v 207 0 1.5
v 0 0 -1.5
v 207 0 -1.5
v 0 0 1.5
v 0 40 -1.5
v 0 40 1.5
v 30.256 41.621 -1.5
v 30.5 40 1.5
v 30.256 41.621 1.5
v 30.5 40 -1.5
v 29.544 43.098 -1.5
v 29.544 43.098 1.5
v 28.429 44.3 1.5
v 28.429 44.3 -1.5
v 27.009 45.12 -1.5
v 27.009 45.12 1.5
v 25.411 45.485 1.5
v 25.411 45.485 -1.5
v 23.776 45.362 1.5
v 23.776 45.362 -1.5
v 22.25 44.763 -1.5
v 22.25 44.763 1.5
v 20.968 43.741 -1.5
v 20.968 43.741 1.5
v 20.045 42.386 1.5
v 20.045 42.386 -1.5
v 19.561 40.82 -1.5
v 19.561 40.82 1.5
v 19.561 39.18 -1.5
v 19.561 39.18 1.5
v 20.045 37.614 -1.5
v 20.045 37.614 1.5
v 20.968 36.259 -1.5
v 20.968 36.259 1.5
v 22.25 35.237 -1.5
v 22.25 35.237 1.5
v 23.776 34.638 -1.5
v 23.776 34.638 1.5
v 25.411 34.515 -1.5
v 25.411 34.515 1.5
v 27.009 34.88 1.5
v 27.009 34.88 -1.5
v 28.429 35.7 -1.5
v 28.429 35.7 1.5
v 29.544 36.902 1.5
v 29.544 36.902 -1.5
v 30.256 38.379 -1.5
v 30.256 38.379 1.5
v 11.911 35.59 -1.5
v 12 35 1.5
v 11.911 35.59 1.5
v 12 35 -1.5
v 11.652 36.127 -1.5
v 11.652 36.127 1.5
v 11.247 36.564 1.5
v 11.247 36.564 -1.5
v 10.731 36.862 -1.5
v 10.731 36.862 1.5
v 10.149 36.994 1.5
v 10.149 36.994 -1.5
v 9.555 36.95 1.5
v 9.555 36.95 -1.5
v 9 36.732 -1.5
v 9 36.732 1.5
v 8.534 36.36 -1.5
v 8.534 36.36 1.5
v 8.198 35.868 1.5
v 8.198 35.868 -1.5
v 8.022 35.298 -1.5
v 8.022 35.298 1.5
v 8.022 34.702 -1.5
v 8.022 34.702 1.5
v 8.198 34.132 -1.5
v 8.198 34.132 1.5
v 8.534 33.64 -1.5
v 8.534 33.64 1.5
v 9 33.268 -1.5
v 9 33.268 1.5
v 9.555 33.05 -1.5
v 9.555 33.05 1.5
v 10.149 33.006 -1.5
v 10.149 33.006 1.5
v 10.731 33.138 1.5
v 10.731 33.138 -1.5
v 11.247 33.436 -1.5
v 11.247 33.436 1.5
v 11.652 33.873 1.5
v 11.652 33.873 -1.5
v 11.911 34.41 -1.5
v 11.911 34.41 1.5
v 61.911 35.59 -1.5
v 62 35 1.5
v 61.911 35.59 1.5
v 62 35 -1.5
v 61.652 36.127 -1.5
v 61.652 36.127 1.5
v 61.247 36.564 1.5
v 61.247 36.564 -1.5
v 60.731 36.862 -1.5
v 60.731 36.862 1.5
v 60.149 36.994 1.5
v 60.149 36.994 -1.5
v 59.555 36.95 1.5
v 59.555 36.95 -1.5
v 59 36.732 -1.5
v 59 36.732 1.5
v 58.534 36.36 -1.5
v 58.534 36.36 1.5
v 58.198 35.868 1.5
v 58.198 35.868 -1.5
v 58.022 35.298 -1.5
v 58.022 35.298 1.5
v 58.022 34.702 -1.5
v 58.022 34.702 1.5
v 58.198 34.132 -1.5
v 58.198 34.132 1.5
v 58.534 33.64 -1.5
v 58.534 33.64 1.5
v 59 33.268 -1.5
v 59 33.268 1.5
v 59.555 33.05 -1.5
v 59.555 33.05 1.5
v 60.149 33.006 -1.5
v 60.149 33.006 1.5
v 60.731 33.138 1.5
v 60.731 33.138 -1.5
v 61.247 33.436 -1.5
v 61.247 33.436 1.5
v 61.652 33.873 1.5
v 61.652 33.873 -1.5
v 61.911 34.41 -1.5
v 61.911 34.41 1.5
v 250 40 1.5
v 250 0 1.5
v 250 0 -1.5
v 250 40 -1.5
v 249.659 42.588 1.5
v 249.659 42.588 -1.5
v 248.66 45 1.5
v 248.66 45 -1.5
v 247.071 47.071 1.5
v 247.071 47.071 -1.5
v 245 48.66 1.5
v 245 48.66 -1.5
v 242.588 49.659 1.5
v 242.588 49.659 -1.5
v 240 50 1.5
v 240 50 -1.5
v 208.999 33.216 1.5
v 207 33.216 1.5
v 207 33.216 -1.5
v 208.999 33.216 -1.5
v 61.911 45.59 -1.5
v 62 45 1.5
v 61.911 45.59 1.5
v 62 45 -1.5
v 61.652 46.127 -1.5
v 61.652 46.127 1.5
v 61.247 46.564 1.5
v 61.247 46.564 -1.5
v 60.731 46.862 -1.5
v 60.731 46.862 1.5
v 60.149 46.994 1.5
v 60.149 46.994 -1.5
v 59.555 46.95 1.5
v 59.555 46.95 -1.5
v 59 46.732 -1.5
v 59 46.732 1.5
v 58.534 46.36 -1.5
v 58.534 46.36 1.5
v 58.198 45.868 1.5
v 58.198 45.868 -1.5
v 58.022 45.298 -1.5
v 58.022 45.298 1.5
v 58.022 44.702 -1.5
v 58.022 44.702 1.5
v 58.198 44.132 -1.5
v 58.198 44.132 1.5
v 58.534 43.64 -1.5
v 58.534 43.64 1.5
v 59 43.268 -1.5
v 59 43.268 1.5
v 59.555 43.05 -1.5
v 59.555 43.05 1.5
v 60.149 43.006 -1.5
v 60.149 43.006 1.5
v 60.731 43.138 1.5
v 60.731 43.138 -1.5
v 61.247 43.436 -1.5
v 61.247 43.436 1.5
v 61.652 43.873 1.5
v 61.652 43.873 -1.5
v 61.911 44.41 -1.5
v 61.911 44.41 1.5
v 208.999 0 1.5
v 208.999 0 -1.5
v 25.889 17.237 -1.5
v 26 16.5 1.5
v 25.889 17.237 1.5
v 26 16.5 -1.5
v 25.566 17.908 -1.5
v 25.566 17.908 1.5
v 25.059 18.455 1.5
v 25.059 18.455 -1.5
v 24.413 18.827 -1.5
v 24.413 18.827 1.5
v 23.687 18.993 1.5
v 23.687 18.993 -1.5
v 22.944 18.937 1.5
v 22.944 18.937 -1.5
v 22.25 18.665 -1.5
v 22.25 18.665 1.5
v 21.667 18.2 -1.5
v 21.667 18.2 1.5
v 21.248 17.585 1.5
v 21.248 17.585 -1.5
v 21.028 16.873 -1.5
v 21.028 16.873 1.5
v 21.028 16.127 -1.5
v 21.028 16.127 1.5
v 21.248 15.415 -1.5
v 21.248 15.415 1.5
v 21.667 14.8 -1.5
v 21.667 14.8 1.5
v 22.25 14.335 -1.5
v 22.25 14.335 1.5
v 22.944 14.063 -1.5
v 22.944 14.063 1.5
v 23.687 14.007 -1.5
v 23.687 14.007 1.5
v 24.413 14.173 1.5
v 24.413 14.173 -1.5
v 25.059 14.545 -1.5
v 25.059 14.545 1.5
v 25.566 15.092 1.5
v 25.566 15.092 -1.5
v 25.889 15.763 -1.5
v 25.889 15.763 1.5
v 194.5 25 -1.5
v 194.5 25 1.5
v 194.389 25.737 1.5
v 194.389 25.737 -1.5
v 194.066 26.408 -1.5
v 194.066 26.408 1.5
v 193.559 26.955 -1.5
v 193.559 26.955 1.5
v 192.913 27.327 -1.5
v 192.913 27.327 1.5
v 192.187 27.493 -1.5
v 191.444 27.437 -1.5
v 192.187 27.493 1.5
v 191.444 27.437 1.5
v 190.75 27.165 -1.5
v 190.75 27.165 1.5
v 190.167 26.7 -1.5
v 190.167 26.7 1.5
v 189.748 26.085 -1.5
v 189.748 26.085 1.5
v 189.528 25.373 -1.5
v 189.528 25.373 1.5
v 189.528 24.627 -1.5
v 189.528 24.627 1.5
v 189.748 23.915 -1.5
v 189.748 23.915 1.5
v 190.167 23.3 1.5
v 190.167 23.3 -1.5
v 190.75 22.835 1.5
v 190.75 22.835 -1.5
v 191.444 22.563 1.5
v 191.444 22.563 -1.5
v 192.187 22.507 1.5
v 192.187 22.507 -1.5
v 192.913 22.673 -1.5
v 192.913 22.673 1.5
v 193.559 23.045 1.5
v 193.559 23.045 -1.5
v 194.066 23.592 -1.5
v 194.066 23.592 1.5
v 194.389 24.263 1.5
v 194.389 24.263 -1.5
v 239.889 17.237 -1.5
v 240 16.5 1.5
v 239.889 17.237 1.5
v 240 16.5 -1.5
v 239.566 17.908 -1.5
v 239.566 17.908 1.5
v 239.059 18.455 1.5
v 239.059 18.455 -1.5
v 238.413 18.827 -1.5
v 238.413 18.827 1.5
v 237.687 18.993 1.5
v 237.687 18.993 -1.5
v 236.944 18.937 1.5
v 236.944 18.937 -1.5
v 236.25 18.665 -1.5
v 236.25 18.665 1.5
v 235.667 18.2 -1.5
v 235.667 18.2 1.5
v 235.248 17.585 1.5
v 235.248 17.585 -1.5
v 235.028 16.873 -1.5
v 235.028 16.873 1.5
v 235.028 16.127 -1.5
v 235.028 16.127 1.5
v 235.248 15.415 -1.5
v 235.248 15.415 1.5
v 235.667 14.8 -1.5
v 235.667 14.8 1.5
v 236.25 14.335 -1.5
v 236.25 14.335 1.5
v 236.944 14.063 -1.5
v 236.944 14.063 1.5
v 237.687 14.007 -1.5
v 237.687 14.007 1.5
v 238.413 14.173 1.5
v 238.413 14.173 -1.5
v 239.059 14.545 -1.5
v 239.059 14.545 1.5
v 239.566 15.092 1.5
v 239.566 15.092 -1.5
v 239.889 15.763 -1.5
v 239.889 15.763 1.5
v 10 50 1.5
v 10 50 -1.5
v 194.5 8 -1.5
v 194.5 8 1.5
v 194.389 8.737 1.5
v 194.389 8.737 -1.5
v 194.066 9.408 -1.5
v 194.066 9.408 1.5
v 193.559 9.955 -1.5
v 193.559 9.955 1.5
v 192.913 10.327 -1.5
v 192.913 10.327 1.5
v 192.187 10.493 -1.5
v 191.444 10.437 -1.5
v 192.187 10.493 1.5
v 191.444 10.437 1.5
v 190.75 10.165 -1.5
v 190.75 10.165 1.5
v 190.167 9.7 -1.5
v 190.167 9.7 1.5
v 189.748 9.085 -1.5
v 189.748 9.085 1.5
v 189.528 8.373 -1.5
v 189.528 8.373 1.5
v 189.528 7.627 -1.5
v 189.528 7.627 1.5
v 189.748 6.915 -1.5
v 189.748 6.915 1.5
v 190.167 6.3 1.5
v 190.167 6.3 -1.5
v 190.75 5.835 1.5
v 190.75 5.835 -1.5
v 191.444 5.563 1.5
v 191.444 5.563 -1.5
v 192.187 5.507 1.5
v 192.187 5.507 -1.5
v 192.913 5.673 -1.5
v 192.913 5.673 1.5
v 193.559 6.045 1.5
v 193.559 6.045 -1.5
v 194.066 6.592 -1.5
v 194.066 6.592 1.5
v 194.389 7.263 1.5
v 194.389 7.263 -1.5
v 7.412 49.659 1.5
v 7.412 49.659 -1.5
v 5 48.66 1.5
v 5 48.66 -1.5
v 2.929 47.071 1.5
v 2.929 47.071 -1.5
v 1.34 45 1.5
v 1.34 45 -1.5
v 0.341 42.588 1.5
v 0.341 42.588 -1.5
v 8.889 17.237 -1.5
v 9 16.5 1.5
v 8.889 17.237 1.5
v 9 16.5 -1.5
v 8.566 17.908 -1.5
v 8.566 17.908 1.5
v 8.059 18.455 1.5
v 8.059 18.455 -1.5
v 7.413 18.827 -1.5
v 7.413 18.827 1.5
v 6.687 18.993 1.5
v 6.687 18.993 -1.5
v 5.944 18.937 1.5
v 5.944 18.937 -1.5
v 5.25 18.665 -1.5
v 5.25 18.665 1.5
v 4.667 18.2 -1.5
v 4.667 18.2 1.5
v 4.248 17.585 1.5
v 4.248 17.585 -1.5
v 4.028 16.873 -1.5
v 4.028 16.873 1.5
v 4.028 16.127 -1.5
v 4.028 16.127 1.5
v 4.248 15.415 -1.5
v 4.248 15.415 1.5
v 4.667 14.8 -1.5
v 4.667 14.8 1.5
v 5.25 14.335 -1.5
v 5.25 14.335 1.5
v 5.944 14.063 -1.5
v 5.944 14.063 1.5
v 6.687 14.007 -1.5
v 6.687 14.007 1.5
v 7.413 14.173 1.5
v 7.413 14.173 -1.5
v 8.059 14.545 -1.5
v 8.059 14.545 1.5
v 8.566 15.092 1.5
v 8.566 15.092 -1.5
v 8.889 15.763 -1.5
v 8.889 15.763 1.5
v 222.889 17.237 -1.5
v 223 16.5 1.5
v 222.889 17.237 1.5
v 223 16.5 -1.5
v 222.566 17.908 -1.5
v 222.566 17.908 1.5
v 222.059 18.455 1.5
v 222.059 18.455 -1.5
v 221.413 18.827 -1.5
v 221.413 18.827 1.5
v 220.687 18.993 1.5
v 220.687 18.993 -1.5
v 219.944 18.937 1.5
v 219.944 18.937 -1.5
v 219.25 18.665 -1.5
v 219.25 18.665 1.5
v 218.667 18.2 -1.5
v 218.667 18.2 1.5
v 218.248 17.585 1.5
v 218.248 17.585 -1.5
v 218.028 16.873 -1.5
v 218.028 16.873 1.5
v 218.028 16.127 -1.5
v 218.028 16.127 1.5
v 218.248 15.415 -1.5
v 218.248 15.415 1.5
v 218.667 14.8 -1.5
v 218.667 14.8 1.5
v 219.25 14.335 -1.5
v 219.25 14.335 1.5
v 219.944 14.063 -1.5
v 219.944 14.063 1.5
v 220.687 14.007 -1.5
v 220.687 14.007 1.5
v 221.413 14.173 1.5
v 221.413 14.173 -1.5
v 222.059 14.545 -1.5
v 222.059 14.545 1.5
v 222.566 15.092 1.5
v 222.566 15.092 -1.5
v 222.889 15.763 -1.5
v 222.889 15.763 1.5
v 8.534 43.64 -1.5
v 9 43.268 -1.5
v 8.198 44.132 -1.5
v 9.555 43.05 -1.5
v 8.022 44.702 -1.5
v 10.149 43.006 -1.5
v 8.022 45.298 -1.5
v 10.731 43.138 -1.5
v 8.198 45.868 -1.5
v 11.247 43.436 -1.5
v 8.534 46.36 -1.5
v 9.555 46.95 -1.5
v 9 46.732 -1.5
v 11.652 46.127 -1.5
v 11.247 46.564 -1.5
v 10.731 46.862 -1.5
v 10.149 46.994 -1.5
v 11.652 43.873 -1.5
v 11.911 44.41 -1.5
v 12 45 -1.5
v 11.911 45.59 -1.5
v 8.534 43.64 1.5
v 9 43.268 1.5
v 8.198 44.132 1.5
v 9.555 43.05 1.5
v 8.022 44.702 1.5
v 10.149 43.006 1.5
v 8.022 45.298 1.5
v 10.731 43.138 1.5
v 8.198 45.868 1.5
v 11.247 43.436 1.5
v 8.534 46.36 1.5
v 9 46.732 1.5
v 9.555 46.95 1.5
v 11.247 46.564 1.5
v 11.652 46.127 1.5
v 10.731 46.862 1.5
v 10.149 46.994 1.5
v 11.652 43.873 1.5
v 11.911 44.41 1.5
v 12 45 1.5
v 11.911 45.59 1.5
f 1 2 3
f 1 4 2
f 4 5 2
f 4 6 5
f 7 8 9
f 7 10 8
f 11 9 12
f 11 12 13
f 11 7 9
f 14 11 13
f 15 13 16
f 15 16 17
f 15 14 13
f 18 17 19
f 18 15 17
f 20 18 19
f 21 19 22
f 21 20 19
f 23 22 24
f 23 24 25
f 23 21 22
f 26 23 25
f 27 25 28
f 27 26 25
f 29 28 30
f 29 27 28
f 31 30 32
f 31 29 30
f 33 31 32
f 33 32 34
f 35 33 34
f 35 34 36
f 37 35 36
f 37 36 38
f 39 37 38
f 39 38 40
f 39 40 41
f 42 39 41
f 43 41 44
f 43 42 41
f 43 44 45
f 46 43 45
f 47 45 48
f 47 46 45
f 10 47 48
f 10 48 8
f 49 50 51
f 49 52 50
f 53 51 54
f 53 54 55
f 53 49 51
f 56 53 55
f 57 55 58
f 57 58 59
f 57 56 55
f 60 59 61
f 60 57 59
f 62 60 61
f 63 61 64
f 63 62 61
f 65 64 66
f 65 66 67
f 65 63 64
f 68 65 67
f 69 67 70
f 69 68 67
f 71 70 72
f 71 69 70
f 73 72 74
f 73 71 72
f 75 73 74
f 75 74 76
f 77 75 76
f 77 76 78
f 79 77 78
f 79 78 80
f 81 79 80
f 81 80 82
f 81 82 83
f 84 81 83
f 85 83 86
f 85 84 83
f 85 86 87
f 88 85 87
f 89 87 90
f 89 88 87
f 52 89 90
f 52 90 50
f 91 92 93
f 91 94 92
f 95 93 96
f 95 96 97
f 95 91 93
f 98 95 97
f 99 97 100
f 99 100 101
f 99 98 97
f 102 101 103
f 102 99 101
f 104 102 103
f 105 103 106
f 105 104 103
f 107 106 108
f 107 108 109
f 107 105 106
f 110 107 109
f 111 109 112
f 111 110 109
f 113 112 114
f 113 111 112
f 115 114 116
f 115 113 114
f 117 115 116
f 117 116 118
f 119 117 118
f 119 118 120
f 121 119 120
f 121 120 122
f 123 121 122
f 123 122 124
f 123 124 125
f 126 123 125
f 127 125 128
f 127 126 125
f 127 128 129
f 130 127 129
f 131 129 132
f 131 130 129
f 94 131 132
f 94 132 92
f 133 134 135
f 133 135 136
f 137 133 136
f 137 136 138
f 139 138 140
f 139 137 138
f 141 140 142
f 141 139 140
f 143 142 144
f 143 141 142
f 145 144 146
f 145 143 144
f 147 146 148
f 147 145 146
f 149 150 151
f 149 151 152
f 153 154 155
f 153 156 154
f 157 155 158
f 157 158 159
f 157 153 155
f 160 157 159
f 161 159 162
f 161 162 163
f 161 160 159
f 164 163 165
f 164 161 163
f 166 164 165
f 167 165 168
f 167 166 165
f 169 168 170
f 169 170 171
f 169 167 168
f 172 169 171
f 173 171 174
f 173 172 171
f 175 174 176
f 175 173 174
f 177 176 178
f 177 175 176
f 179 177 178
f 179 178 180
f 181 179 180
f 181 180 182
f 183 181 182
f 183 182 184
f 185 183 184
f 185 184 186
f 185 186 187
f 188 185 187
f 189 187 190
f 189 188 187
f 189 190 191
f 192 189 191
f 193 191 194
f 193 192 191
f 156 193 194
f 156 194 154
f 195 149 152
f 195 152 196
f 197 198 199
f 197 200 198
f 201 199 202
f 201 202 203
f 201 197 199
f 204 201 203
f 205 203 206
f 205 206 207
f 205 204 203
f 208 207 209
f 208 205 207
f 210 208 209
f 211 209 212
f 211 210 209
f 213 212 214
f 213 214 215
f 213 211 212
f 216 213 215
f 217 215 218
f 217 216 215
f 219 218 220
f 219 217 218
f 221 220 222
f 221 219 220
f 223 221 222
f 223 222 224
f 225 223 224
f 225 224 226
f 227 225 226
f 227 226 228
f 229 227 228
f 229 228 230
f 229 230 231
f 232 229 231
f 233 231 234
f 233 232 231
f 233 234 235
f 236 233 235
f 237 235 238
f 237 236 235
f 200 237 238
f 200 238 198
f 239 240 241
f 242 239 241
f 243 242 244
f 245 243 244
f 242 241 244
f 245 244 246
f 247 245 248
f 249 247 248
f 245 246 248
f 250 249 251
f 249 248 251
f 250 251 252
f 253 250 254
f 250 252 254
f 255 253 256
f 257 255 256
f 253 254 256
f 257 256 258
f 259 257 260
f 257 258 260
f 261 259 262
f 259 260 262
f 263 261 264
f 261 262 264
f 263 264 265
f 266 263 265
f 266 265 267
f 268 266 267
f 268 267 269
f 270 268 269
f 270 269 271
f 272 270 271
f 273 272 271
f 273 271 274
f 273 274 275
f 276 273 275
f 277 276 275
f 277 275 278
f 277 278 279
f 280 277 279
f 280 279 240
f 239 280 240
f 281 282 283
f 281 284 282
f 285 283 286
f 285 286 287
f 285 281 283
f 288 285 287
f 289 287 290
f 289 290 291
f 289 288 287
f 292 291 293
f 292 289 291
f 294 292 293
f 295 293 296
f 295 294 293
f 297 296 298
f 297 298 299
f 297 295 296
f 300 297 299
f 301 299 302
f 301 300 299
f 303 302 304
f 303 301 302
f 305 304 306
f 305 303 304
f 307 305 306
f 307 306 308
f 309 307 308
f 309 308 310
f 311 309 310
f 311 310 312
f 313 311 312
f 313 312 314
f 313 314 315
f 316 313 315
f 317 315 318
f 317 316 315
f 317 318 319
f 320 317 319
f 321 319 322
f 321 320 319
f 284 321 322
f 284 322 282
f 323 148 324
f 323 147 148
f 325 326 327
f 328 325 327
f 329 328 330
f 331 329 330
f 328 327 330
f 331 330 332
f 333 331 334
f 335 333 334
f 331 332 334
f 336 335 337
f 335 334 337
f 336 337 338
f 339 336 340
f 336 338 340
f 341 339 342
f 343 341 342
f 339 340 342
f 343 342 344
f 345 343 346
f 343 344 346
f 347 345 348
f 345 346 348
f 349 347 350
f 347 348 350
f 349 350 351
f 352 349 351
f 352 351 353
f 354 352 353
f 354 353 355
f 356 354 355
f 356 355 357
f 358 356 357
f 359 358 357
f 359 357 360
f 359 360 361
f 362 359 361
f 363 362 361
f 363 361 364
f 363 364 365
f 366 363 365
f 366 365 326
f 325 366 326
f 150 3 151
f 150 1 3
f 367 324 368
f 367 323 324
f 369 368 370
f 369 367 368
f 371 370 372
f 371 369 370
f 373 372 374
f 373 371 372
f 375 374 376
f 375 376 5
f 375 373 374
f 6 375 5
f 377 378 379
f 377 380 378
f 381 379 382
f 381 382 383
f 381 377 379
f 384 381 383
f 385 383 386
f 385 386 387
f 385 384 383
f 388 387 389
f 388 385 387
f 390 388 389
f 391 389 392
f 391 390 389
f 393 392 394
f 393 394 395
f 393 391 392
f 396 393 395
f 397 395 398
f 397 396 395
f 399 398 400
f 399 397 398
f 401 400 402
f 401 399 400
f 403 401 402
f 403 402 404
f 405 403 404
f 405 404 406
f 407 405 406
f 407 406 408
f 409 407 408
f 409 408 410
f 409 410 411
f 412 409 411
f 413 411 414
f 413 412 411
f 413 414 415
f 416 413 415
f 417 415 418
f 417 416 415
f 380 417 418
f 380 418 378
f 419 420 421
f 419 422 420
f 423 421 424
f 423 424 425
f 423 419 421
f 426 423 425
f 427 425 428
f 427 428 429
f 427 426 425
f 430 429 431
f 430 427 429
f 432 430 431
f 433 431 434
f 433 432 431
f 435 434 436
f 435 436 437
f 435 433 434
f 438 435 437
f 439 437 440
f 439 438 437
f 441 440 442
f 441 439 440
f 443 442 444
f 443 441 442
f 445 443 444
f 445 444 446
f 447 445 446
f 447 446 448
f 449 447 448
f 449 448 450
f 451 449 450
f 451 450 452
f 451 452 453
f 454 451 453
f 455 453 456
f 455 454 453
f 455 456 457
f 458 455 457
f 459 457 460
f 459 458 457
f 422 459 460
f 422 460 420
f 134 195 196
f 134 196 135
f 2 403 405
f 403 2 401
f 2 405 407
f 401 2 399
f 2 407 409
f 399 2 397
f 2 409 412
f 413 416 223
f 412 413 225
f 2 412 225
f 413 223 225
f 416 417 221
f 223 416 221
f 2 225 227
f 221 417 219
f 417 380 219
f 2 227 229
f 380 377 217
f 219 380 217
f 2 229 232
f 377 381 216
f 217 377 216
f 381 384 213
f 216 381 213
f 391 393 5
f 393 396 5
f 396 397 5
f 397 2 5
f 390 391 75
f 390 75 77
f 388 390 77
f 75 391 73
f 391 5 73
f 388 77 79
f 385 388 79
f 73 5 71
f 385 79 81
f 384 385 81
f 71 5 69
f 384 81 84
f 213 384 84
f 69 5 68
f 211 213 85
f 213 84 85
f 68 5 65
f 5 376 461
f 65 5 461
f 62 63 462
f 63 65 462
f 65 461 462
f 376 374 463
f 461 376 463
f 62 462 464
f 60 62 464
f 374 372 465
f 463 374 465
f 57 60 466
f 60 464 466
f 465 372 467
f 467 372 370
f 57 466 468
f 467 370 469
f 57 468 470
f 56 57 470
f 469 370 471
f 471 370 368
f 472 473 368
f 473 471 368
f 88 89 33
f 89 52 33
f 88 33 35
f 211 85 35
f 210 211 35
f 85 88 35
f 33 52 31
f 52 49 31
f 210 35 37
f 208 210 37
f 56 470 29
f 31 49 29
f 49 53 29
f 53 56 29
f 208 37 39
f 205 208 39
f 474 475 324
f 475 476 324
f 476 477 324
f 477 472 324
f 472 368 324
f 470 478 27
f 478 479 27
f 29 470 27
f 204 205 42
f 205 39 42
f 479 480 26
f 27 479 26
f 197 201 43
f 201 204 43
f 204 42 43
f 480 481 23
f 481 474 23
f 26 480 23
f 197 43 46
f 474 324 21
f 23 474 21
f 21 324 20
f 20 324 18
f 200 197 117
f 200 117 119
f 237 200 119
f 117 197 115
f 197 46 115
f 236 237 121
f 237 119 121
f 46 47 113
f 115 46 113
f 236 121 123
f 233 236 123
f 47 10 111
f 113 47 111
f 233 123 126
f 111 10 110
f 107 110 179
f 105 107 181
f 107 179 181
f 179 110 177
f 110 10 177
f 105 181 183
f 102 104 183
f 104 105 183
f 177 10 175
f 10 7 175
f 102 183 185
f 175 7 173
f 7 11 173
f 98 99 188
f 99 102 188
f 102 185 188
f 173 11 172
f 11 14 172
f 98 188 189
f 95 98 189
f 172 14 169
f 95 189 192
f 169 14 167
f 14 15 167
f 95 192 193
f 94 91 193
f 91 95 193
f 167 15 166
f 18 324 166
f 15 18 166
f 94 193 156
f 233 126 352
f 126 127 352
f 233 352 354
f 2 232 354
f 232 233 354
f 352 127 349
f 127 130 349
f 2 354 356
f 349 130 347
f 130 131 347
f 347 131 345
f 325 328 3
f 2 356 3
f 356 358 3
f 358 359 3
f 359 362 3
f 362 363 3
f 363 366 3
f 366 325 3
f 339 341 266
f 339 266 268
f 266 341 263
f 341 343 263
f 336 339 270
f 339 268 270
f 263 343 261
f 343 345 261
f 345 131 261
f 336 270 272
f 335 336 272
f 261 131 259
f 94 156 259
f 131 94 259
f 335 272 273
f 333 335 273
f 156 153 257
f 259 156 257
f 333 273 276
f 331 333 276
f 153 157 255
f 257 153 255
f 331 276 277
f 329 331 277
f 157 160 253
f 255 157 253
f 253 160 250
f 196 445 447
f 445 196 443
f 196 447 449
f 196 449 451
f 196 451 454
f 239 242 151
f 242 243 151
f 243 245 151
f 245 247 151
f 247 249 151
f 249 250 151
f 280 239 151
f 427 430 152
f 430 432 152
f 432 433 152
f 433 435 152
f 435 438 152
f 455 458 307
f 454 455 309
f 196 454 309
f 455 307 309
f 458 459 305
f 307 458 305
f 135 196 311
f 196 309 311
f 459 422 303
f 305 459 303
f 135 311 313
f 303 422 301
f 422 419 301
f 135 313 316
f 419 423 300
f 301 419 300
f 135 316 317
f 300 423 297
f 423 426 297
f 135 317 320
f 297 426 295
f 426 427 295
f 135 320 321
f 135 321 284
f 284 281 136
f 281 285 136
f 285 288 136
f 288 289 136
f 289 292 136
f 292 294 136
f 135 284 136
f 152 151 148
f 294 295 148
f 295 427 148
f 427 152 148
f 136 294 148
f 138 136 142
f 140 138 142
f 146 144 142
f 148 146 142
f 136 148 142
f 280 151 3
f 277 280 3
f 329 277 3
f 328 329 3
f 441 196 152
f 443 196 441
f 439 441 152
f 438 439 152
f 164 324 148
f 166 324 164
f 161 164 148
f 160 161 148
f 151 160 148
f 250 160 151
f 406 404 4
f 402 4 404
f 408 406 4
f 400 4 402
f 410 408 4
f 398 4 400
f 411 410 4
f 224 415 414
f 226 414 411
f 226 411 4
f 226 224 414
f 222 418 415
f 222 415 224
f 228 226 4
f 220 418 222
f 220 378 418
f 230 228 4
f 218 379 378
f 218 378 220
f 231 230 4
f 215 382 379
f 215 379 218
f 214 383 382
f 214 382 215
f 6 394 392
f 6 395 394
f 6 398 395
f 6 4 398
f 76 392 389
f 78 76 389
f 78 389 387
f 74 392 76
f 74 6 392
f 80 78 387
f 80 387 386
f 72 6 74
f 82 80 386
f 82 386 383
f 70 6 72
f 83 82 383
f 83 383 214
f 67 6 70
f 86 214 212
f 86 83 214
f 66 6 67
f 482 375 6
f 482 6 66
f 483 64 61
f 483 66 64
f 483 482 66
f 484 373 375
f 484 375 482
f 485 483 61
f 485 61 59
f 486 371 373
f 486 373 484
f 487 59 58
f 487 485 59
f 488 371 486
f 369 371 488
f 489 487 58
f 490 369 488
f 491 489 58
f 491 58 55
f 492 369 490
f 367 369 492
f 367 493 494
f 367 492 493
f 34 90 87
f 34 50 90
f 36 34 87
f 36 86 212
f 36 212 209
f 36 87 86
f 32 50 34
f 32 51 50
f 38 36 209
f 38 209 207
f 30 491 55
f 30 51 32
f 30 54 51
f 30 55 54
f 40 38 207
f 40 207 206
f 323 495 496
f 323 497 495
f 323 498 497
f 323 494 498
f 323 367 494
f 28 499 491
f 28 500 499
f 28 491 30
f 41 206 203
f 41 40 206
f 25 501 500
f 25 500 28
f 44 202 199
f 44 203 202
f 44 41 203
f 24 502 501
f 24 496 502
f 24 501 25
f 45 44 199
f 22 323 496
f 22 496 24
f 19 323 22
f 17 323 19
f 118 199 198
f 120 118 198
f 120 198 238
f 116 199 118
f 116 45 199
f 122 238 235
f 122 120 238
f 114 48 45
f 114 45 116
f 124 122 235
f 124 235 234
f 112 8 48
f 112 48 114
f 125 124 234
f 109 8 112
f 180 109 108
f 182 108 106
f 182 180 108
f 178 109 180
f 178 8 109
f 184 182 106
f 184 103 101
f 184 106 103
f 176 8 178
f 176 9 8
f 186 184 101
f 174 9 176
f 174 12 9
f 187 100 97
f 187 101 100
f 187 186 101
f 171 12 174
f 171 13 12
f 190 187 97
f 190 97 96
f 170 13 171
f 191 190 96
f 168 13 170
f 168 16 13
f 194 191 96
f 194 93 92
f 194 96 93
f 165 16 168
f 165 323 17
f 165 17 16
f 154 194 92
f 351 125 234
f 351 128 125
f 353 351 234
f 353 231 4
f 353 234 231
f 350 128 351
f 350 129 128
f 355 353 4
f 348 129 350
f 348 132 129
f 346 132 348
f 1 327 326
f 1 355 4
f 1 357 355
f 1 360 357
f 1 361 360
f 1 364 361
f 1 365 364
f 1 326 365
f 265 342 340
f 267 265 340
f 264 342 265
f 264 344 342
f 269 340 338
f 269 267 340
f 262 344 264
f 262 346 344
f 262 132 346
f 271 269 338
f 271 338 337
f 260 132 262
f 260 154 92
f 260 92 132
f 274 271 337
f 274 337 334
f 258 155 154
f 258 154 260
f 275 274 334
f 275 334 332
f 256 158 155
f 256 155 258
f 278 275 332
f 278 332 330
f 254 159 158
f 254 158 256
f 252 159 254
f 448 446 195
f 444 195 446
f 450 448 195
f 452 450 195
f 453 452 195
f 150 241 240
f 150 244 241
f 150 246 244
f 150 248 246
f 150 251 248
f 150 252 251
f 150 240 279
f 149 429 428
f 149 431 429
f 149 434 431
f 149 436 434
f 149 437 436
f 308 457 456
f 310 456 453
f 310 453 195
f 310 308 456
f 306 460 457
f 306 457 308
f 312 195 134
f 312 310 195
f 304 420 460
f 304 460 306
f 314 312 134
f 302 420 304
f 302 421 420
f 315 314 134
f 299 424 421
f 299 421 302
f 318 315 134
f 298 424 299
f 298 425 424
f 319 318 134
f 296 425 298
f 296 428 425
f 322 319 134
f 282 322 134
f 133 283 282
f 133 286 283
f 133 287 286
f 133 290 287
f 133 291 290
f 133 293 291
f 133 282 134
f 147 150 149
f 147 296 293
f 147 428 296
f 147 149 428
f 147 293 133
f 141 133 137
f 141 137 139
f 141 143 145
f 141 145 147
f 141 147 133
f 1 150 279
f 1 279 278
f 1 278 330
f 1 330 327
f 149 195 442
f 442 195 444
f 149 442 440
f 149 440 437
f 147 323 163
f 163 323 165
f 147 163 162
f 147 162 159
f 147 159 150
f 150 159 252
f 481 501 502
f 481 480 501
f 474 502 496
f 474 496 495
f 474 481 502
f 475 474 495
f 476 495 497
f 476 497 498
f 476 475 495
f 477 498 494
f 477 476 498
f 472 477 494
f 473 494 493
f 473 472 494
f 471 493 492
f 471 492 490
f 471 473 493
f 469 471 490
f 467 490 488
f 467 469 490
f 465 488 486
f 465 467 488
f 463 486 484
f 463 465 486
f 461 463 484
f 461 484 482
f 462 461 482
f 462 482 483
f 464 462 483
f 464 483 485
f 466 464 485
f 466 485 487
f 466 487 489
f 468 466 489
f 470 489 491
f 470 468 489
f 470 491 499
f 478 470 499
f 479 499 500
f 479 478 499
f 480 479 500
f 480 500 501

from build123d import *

# Parameters (mm, degrees)
SKETCH_2_R          = 2
SKETCH_2_R_2        = 5.5
SKETCH_2_R_3        = 2.5
EXTRUDE_1_DEPTH     = 1.5
SKETCH_3_R          = 2.5
CUT_EXTRUDE_1_DEPTH = 10


with BuildPart() as part:
    # 草图2 → 凸台-拉伸1 (new, symmetric)
    with BuildSketch(Plane.XY):
        with BuildLine():
            Line((120, 0), (207, 0))
            Line((207, 0), (207, 33.215924565))
            Line((207, 33.215924565), (208.99932908, 33.215924565))
            Line((208.99932908, 33.215924565), (208.99932908, 0))
            Line((208.99932908, 0), (250, 0))
            Line((250, 0), (250, 40))
            ThreePointArc((250, 40), (247.071067812, 47.071067812), (240, 50))
            Line((240, 50), (10, 50))
            ThreePointArc((10, 50), (2.928932188, 47.071067812), (0, 40))
            Line((0, 40), (0, 0))
            Line((0, 0), (30, 0))
            Line((30, 0), (120, 0))
        make_face()
        with Locations((10, 45)):
            Circle(SKETCH_2_R, mode=Mode.SUBTRACT)
        with Locations((10, 35)):
            Circle(SKETCH_2_R, mode=Mode.SUBTRACT)
        with Locations((60, 45)):
            Circle(SKETCH_2_R, mode=Mode.SUBTRACT)
        with Locations((60, 35)):
            Circle(SKETCH_2_R, mode=Mode.SUBTRACT)
        with Locations((25, 40)):
            Circle(SKETCH_2_R_2, mode=Mode.SUBTRACT)
        with Locations((6.5, 16.5)):
            Circle(SKETCH_2_R_3, mode=Mode.SUBTRACT)
        with Locations((23.5, 16.5)):
            Circle(SKETCH_2_R_3, mode=Mode.SUBTRACT)
        with Locations((220.5, 16.5)):
            Circle(SKETCH_2_R_3, mode=Mode.SUBTRACT)
        with Locations((237.5, 16.5)):
            Circle(SKETCH_2_R_3, mode=Mode.SUBTRACT)
    extrude(amount=EXTRUDE_1_DEPTH, both=True)

    # 草图3 → 切除-拉伸1 (cut)
    with BuildSketch(Plane.XY.offset(1.5)):
        with Locations((192, 25)):
            Circle(SKETCH_3_R)
        with Locations((192, 8)):
            Circle(SKETCH_3_R)
    extrude(amount=-CUT_EXTRUDE_1_DEPTH, mode=Mode.SUBTRACT)


solid = part.part
